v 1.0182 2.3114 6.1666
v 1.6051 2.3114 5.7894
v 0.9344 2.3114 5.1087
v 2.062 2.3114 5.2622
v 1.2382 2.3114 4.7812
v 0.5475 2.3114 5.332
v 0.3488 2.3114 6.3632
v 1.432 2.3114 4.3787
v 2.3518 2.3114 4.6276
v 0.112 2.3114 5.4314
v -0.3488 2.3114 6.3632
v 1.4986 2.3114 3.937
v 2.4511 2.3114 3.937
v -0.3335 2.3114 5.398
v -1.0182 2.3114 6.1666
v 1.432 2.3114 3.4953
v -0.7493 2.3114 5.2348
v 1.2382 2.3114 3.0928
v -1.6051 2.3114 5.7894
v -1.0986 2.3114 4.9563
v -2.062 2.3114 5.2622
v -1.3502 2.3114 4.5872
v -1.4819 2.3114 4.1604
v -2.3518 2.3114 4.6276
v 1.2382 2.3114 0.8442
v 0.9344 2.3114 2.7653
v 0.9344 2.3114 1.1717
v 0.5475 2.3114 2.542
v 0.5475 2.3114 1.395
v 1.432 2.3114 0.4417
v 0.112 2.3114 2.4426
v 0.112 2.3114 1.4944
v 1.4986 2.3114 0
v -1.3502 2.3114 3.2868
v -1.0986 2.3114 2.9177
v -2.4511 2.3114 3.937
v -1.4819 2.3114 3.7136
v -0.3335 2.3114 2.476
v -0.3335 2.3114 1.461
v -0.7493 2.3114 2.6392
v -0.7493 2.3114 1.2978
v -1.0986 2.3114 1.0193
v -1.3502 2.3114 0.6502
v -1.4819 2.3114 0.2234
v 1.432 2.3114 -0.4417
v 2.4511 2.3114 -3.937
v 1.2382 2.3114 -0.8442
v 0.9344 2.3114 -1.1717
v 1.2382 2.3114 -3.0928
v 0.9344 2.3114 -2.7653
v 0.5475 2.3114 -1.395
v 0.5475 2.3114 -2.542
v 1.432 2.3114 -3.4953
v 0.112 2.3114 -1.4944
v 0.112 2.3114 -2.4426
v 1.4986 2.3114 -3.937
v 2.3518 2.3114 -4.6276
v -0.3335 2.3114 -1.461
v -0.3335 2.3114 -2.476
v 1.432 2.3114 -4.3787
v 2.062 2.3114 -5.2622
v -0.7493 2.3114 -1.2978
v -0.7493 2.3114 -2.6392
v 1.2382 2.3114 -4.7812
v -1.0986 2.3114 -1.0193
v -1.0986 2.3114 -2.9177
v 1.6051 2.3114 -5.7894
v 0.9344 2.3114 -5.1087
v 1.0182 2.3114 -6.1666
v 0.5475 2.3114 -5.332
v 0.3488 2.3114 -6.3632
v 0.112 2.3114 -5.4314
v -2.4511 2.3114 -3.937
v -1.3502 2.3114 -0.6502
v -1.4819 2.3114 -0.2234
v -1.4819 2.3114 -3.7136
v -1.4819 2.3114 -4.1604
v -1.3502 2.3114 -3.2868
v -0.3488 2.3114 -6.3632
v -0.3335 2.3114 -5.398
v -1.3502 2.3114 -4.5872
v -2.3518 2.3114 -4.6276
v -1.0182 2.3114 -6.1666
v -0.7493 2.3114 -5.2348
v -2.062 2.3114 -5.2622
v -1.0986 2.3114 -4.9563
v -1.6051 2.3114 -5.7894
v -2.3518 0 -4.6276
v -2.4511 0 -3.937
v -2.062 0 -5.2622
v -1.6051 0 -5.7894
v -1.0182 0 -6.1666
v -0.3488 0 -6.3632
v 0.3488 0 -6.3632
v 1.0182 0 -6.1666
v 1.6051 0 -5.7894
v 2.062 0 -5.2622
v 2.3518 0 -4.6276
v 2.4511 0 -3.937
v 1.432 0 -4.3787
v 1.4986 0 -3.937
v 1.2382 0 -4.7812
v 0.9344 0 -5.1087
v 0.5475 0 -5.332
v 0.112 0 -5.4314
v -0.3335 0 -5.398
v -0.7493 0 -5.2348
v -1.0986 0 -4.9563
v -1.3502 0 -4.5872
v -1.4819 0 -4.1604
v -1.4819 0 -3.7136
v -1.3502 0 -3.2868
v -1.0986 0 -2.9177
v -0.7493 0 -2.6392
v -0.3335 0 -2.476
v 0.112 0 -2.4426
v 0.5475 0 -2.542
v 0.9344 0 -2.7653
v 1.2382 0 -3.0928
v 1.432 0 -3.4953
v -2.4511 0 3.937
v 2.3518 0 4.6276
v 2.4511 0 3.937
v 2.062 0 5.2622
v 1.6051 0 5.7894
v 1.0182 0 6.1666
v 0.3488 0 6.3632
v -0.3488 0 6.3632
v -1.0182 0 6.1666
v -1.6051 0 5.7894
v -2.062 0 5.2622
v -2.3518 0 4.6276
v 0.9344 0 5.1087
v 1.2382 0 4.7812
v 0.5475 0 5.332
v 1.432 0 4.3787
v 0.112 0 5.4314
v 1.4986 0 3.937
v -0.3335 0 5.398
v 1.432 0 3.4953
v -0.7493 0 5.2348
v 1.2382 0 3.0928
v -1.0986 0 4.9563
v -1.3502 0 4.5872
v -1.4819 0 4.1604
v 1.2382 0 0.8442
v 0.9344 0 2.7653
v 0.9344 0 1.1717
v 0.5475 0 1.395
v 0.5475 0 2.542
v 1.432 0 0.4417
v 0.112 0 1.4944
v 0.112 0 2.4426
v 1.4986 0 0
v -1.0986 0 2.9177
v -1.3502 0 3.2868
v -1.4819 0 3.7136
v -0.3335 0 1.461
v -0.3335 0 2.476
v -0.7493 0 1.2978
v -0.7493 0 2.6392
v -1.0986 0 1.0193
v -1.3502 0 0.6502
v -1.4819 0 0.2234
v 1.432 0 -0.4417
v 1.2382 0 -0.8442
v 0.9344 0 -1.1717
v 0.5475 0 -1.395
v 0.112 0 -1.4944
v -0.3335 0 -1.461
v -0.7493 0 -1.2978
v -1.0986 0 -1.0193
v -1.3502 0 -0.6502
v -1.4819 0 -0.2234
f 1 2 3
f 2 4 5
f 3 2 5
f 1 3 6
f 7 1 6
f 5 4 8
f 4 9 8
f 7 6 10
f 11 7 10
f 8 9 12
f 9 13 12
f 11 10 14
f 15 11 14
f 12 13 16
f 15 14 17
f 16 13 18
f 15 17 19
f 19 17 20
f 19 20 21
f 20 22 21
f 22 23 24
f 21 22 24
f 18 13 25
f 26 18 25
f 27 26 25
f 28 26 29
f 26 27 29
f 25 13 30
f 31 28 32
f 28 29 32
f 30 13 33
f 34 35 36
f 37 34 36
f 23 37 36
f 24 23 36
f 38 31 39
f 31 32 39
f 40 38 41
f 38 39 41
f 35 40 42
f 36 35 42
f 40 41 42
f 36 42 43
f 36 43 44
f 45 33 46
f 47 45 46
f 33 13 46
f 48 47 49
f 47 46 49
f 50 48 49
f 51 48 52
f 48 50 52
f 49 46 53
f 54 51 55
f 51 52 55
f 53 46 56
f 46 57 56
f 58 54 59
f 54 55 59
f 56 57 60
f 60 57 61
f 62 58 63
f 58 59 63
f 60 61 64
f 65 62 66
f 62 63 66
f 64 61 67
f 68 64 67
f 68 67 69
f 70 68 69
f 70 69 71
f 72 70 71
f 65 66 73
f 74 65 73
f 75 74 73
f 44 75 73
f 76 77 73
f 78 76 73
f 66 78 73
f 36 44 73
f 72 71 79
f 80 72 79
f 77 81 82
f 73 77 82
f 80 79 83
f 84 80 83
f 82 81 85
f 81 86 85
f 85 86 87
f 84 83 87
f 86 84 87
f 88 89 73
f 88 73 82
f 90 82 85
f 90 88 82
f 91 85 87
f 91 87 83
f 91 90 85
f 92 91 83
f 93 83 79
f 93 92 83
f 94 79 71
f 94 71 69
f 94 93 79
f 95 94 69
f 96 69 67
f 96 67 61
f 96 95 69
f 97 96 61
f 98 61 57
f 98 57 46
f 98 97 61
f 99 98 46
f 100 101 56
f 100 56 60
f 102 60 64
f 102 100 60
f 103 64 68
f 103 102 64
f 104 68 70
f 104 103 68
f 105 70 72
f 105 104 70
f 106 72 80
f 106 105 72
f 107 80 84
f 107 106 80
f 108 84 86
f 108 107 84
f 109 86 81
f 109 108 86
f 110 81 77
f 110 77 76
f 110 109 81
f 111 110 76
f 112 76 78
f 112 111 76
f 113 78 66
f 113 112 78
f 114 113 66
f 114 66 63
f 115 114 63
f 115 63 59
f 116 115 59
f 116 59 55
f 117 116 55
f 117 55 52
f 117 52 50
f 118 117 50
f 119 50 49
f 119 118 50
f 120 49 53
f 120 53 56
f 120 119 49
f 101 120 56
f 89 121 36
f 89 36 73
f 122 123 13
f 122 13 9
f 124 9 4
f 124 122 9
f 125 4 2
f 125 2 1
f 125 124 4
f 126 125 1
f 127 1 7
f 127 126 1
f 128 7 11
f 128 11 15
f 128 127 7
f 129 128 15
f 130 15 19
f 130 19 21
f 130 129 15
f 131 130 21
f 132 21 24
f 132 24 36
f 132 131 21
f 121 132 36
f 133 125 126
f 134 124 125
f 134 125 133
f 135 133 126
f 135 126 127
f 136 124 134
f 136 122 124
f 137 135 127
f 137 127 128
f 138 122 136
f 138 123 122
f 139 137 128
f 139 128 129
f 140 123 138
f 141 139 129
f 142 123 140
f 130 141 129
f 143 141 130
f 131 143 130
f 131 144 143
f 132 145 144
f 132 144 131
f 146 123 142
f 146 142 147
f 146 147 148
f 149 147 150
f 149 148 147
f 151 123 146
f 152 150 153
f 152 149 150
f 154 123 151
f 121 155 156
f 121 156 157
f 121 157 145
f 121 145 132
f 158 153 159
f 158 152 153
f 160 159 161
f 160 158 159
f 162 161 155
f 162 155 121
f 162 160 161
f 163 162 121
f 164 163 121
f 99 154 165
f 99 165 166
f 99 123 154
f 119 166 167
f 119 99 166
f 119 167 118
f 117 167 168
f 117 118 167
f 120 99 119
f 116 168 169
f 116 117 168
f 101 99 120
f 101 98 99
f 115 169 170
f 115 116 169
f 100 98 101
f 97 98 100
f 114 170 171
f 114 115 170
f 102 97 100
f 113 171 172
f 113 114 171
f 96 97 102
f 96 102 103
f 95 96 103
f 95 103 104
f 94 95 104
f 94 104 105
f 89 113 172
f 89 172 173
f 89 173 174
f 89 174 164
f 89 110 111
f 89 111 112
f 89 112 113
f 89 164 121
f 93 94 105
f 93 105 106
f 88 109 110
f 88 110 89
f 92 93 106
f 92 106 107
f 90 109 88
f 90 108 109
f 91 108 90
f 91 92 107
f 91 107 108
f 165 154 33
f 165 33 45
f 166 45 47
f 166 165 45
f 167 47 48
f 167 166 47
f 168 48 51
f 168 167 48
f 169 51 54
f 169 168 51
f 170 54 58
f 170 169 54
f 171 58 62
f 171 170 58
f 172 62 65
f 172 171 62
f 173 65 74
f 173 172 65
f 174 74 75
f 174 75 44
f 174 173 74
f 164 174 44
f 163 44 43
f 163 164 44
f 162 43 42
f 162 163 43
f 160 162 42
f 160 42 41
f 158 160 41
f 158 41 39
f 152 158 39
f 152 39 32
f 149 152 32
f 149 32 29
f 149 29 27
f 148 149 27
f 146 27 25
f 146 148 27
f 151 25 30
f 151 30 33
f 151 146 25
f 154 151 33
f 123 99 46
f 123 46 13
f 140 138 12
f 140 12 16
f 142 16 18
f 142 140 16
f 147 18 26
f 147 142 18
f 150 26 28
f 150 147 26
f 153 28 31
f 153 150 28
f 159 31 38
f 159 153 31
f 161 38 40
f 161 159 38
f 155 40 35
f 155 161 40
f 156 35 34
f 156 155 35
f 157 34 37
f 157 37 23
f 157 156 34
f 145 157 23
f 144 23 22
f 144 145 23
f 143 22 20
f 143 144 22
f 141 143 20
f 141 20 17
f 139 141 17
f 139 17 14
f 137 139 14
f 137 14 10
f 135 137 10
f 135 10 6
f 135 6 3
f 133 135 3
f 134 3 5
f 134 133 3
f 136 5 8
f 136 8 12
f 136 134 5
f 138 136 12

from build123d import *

# Parameters (mm, degrees)
SKETCH1_R           = 1.4986
BOSS_EXTRUDE1_DEPTH = 2.3114


with BuildPart() as part:
    # Sketch1 → Boss-Extrude1 (new body)
    with BuildSketch(Plane(origin=(0, 0, 0), x_dir=(1, 0, 0), z_dir=(0, 1, 0))):
        with BuildLine():
            Line((-2.4511, -3.937), (-2.4511, 3.937))
            ThreePointArc((-2.4511, 3.937), (0, 6.3881), (2.4511, 3.937))
            Line((2.4511, 3.937), (2.4511, -3.937))
            ThreePointArc((2.4511, -3.937), (0, -6.3881), (-2.4511, -3.937))
        make_face()
        with Locations((0, 3.937)):
            Circle(SKETCH1_R, mode=Mode.SUBTRACT)
        with Locations((0, -3.937)):
            Circle(SKETCH1_R, mode=Mode.SUBTRACT)
        Circle(SKETCH1_R, mode=Mode.SUBTRACT)
    extrude(amount=BOSS_EXTRUDE1_DEPTH)


solid = part.part
